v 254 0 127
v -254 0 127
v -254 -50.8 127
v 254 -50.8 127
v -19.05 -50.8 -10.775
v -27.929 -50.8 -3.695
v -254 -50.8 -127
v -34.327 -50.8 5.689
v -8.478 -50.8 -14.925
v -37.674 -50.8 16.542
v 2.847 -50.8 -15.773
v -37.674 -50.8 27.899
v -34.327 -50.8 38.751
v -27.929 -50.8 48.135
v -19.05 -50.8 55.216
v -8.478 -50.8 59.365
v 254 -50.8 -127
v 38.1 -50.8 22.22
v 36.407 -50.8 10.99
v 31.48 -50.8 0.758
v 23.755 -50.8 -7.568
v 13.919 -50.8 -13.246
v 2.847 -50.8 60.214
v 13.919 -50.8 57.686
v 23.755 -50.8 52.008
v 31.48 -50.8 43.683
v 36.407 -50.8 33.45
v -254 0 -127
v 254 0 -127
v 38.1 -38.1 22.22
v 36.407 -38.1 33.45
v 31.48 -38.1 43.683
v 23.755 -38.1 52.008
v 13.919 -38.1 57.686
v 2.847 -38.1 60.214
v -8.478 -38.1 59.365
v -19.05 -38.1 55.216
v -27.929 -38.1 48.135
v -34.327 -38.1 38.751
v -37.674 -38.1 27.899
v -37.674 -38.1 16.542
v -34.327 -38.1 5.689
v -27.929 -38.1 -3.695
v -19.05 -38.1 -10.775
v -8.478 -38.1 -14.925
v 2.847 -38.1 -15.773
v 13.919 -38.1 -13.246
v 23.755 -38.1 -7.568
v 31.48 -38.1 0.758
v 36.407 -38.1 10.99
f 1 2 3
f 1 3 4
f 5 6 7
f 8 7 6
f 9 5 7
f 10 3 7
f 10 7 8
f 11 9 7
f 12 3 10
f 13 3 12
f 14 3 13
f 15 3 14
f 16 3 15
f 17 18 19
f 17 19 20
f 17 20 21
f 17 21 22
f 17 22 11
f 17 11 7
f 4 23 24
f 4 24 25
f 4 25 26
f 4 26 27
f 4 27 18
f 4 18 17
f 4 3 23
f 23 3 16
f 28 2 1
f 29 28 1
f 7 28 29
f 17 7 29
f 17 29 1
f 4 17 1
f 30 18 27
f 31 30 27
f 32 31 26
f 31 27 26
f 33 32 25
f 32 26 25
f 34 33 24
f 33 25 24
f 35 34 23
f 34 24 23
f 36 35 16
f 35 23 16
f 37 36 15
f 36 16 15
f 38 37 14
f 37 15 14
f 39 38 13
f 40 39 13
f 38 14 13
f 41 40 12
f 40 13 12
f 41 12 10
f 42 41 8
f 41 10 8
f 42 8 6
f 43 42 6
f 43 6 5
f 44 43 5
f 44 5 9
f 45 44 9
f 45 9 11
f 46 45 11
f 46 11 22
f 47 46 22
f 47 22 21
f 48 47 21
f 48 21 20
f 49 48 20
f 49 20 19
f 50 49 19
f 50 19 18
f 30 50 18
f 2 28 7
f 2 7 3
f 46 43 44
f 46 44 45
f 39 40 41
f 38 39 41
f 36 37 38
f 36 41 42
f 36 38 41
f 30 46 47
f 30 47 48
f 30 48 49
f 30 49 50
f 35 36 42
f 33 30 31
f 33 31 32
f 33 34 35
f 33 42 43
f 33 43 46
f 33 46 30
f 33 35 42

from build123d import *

# Parameters (mm, degrees)
F0_W     = 508
F0_H     = 254
F1_DEPTH = 50.8
F2_R     = 38.1
F3_DEPTH = 12.7
F4_R     = 25.4
F5_DEPTH = 12.7
F6_R     = 50.631334
F7_DEPTH = 25.4


with BuildPart() as f1:
    # F0 (on Front) → F1 (new body)
    with BuildSketch(Plane.XZ):
        Rectangle(F0_W, F0_H)
    extrude(amount=F1_DEPTH)

    # F2 (on face) → F3 (cut)
    with BuildSketch(Plane.XZ.offset(50.8)):
        with Locations((0, 22.220068)):
            Circle(F2_R)
    extrude(amount=-F3_DEPTH, mode=Mode.SUBTRACT)

    # F4 (on face) → F5 (join)
    with BuildSketch(Plane.XZ.offset(50.8)):
        with Locations((-48.272954, -19.034895)):
            Circle(F4_R)
    extrude(amount=-F5_DEPTH)

    # F6 (on face) → F7 (join)
    with BuildSketch(Plane.XZ.offset(50.8)):
        with Locations((-68.167724, -34.581438)):
            Circle(F6_R)
    extrude(amount=-F7_DEPTH)


solid = f1.part
